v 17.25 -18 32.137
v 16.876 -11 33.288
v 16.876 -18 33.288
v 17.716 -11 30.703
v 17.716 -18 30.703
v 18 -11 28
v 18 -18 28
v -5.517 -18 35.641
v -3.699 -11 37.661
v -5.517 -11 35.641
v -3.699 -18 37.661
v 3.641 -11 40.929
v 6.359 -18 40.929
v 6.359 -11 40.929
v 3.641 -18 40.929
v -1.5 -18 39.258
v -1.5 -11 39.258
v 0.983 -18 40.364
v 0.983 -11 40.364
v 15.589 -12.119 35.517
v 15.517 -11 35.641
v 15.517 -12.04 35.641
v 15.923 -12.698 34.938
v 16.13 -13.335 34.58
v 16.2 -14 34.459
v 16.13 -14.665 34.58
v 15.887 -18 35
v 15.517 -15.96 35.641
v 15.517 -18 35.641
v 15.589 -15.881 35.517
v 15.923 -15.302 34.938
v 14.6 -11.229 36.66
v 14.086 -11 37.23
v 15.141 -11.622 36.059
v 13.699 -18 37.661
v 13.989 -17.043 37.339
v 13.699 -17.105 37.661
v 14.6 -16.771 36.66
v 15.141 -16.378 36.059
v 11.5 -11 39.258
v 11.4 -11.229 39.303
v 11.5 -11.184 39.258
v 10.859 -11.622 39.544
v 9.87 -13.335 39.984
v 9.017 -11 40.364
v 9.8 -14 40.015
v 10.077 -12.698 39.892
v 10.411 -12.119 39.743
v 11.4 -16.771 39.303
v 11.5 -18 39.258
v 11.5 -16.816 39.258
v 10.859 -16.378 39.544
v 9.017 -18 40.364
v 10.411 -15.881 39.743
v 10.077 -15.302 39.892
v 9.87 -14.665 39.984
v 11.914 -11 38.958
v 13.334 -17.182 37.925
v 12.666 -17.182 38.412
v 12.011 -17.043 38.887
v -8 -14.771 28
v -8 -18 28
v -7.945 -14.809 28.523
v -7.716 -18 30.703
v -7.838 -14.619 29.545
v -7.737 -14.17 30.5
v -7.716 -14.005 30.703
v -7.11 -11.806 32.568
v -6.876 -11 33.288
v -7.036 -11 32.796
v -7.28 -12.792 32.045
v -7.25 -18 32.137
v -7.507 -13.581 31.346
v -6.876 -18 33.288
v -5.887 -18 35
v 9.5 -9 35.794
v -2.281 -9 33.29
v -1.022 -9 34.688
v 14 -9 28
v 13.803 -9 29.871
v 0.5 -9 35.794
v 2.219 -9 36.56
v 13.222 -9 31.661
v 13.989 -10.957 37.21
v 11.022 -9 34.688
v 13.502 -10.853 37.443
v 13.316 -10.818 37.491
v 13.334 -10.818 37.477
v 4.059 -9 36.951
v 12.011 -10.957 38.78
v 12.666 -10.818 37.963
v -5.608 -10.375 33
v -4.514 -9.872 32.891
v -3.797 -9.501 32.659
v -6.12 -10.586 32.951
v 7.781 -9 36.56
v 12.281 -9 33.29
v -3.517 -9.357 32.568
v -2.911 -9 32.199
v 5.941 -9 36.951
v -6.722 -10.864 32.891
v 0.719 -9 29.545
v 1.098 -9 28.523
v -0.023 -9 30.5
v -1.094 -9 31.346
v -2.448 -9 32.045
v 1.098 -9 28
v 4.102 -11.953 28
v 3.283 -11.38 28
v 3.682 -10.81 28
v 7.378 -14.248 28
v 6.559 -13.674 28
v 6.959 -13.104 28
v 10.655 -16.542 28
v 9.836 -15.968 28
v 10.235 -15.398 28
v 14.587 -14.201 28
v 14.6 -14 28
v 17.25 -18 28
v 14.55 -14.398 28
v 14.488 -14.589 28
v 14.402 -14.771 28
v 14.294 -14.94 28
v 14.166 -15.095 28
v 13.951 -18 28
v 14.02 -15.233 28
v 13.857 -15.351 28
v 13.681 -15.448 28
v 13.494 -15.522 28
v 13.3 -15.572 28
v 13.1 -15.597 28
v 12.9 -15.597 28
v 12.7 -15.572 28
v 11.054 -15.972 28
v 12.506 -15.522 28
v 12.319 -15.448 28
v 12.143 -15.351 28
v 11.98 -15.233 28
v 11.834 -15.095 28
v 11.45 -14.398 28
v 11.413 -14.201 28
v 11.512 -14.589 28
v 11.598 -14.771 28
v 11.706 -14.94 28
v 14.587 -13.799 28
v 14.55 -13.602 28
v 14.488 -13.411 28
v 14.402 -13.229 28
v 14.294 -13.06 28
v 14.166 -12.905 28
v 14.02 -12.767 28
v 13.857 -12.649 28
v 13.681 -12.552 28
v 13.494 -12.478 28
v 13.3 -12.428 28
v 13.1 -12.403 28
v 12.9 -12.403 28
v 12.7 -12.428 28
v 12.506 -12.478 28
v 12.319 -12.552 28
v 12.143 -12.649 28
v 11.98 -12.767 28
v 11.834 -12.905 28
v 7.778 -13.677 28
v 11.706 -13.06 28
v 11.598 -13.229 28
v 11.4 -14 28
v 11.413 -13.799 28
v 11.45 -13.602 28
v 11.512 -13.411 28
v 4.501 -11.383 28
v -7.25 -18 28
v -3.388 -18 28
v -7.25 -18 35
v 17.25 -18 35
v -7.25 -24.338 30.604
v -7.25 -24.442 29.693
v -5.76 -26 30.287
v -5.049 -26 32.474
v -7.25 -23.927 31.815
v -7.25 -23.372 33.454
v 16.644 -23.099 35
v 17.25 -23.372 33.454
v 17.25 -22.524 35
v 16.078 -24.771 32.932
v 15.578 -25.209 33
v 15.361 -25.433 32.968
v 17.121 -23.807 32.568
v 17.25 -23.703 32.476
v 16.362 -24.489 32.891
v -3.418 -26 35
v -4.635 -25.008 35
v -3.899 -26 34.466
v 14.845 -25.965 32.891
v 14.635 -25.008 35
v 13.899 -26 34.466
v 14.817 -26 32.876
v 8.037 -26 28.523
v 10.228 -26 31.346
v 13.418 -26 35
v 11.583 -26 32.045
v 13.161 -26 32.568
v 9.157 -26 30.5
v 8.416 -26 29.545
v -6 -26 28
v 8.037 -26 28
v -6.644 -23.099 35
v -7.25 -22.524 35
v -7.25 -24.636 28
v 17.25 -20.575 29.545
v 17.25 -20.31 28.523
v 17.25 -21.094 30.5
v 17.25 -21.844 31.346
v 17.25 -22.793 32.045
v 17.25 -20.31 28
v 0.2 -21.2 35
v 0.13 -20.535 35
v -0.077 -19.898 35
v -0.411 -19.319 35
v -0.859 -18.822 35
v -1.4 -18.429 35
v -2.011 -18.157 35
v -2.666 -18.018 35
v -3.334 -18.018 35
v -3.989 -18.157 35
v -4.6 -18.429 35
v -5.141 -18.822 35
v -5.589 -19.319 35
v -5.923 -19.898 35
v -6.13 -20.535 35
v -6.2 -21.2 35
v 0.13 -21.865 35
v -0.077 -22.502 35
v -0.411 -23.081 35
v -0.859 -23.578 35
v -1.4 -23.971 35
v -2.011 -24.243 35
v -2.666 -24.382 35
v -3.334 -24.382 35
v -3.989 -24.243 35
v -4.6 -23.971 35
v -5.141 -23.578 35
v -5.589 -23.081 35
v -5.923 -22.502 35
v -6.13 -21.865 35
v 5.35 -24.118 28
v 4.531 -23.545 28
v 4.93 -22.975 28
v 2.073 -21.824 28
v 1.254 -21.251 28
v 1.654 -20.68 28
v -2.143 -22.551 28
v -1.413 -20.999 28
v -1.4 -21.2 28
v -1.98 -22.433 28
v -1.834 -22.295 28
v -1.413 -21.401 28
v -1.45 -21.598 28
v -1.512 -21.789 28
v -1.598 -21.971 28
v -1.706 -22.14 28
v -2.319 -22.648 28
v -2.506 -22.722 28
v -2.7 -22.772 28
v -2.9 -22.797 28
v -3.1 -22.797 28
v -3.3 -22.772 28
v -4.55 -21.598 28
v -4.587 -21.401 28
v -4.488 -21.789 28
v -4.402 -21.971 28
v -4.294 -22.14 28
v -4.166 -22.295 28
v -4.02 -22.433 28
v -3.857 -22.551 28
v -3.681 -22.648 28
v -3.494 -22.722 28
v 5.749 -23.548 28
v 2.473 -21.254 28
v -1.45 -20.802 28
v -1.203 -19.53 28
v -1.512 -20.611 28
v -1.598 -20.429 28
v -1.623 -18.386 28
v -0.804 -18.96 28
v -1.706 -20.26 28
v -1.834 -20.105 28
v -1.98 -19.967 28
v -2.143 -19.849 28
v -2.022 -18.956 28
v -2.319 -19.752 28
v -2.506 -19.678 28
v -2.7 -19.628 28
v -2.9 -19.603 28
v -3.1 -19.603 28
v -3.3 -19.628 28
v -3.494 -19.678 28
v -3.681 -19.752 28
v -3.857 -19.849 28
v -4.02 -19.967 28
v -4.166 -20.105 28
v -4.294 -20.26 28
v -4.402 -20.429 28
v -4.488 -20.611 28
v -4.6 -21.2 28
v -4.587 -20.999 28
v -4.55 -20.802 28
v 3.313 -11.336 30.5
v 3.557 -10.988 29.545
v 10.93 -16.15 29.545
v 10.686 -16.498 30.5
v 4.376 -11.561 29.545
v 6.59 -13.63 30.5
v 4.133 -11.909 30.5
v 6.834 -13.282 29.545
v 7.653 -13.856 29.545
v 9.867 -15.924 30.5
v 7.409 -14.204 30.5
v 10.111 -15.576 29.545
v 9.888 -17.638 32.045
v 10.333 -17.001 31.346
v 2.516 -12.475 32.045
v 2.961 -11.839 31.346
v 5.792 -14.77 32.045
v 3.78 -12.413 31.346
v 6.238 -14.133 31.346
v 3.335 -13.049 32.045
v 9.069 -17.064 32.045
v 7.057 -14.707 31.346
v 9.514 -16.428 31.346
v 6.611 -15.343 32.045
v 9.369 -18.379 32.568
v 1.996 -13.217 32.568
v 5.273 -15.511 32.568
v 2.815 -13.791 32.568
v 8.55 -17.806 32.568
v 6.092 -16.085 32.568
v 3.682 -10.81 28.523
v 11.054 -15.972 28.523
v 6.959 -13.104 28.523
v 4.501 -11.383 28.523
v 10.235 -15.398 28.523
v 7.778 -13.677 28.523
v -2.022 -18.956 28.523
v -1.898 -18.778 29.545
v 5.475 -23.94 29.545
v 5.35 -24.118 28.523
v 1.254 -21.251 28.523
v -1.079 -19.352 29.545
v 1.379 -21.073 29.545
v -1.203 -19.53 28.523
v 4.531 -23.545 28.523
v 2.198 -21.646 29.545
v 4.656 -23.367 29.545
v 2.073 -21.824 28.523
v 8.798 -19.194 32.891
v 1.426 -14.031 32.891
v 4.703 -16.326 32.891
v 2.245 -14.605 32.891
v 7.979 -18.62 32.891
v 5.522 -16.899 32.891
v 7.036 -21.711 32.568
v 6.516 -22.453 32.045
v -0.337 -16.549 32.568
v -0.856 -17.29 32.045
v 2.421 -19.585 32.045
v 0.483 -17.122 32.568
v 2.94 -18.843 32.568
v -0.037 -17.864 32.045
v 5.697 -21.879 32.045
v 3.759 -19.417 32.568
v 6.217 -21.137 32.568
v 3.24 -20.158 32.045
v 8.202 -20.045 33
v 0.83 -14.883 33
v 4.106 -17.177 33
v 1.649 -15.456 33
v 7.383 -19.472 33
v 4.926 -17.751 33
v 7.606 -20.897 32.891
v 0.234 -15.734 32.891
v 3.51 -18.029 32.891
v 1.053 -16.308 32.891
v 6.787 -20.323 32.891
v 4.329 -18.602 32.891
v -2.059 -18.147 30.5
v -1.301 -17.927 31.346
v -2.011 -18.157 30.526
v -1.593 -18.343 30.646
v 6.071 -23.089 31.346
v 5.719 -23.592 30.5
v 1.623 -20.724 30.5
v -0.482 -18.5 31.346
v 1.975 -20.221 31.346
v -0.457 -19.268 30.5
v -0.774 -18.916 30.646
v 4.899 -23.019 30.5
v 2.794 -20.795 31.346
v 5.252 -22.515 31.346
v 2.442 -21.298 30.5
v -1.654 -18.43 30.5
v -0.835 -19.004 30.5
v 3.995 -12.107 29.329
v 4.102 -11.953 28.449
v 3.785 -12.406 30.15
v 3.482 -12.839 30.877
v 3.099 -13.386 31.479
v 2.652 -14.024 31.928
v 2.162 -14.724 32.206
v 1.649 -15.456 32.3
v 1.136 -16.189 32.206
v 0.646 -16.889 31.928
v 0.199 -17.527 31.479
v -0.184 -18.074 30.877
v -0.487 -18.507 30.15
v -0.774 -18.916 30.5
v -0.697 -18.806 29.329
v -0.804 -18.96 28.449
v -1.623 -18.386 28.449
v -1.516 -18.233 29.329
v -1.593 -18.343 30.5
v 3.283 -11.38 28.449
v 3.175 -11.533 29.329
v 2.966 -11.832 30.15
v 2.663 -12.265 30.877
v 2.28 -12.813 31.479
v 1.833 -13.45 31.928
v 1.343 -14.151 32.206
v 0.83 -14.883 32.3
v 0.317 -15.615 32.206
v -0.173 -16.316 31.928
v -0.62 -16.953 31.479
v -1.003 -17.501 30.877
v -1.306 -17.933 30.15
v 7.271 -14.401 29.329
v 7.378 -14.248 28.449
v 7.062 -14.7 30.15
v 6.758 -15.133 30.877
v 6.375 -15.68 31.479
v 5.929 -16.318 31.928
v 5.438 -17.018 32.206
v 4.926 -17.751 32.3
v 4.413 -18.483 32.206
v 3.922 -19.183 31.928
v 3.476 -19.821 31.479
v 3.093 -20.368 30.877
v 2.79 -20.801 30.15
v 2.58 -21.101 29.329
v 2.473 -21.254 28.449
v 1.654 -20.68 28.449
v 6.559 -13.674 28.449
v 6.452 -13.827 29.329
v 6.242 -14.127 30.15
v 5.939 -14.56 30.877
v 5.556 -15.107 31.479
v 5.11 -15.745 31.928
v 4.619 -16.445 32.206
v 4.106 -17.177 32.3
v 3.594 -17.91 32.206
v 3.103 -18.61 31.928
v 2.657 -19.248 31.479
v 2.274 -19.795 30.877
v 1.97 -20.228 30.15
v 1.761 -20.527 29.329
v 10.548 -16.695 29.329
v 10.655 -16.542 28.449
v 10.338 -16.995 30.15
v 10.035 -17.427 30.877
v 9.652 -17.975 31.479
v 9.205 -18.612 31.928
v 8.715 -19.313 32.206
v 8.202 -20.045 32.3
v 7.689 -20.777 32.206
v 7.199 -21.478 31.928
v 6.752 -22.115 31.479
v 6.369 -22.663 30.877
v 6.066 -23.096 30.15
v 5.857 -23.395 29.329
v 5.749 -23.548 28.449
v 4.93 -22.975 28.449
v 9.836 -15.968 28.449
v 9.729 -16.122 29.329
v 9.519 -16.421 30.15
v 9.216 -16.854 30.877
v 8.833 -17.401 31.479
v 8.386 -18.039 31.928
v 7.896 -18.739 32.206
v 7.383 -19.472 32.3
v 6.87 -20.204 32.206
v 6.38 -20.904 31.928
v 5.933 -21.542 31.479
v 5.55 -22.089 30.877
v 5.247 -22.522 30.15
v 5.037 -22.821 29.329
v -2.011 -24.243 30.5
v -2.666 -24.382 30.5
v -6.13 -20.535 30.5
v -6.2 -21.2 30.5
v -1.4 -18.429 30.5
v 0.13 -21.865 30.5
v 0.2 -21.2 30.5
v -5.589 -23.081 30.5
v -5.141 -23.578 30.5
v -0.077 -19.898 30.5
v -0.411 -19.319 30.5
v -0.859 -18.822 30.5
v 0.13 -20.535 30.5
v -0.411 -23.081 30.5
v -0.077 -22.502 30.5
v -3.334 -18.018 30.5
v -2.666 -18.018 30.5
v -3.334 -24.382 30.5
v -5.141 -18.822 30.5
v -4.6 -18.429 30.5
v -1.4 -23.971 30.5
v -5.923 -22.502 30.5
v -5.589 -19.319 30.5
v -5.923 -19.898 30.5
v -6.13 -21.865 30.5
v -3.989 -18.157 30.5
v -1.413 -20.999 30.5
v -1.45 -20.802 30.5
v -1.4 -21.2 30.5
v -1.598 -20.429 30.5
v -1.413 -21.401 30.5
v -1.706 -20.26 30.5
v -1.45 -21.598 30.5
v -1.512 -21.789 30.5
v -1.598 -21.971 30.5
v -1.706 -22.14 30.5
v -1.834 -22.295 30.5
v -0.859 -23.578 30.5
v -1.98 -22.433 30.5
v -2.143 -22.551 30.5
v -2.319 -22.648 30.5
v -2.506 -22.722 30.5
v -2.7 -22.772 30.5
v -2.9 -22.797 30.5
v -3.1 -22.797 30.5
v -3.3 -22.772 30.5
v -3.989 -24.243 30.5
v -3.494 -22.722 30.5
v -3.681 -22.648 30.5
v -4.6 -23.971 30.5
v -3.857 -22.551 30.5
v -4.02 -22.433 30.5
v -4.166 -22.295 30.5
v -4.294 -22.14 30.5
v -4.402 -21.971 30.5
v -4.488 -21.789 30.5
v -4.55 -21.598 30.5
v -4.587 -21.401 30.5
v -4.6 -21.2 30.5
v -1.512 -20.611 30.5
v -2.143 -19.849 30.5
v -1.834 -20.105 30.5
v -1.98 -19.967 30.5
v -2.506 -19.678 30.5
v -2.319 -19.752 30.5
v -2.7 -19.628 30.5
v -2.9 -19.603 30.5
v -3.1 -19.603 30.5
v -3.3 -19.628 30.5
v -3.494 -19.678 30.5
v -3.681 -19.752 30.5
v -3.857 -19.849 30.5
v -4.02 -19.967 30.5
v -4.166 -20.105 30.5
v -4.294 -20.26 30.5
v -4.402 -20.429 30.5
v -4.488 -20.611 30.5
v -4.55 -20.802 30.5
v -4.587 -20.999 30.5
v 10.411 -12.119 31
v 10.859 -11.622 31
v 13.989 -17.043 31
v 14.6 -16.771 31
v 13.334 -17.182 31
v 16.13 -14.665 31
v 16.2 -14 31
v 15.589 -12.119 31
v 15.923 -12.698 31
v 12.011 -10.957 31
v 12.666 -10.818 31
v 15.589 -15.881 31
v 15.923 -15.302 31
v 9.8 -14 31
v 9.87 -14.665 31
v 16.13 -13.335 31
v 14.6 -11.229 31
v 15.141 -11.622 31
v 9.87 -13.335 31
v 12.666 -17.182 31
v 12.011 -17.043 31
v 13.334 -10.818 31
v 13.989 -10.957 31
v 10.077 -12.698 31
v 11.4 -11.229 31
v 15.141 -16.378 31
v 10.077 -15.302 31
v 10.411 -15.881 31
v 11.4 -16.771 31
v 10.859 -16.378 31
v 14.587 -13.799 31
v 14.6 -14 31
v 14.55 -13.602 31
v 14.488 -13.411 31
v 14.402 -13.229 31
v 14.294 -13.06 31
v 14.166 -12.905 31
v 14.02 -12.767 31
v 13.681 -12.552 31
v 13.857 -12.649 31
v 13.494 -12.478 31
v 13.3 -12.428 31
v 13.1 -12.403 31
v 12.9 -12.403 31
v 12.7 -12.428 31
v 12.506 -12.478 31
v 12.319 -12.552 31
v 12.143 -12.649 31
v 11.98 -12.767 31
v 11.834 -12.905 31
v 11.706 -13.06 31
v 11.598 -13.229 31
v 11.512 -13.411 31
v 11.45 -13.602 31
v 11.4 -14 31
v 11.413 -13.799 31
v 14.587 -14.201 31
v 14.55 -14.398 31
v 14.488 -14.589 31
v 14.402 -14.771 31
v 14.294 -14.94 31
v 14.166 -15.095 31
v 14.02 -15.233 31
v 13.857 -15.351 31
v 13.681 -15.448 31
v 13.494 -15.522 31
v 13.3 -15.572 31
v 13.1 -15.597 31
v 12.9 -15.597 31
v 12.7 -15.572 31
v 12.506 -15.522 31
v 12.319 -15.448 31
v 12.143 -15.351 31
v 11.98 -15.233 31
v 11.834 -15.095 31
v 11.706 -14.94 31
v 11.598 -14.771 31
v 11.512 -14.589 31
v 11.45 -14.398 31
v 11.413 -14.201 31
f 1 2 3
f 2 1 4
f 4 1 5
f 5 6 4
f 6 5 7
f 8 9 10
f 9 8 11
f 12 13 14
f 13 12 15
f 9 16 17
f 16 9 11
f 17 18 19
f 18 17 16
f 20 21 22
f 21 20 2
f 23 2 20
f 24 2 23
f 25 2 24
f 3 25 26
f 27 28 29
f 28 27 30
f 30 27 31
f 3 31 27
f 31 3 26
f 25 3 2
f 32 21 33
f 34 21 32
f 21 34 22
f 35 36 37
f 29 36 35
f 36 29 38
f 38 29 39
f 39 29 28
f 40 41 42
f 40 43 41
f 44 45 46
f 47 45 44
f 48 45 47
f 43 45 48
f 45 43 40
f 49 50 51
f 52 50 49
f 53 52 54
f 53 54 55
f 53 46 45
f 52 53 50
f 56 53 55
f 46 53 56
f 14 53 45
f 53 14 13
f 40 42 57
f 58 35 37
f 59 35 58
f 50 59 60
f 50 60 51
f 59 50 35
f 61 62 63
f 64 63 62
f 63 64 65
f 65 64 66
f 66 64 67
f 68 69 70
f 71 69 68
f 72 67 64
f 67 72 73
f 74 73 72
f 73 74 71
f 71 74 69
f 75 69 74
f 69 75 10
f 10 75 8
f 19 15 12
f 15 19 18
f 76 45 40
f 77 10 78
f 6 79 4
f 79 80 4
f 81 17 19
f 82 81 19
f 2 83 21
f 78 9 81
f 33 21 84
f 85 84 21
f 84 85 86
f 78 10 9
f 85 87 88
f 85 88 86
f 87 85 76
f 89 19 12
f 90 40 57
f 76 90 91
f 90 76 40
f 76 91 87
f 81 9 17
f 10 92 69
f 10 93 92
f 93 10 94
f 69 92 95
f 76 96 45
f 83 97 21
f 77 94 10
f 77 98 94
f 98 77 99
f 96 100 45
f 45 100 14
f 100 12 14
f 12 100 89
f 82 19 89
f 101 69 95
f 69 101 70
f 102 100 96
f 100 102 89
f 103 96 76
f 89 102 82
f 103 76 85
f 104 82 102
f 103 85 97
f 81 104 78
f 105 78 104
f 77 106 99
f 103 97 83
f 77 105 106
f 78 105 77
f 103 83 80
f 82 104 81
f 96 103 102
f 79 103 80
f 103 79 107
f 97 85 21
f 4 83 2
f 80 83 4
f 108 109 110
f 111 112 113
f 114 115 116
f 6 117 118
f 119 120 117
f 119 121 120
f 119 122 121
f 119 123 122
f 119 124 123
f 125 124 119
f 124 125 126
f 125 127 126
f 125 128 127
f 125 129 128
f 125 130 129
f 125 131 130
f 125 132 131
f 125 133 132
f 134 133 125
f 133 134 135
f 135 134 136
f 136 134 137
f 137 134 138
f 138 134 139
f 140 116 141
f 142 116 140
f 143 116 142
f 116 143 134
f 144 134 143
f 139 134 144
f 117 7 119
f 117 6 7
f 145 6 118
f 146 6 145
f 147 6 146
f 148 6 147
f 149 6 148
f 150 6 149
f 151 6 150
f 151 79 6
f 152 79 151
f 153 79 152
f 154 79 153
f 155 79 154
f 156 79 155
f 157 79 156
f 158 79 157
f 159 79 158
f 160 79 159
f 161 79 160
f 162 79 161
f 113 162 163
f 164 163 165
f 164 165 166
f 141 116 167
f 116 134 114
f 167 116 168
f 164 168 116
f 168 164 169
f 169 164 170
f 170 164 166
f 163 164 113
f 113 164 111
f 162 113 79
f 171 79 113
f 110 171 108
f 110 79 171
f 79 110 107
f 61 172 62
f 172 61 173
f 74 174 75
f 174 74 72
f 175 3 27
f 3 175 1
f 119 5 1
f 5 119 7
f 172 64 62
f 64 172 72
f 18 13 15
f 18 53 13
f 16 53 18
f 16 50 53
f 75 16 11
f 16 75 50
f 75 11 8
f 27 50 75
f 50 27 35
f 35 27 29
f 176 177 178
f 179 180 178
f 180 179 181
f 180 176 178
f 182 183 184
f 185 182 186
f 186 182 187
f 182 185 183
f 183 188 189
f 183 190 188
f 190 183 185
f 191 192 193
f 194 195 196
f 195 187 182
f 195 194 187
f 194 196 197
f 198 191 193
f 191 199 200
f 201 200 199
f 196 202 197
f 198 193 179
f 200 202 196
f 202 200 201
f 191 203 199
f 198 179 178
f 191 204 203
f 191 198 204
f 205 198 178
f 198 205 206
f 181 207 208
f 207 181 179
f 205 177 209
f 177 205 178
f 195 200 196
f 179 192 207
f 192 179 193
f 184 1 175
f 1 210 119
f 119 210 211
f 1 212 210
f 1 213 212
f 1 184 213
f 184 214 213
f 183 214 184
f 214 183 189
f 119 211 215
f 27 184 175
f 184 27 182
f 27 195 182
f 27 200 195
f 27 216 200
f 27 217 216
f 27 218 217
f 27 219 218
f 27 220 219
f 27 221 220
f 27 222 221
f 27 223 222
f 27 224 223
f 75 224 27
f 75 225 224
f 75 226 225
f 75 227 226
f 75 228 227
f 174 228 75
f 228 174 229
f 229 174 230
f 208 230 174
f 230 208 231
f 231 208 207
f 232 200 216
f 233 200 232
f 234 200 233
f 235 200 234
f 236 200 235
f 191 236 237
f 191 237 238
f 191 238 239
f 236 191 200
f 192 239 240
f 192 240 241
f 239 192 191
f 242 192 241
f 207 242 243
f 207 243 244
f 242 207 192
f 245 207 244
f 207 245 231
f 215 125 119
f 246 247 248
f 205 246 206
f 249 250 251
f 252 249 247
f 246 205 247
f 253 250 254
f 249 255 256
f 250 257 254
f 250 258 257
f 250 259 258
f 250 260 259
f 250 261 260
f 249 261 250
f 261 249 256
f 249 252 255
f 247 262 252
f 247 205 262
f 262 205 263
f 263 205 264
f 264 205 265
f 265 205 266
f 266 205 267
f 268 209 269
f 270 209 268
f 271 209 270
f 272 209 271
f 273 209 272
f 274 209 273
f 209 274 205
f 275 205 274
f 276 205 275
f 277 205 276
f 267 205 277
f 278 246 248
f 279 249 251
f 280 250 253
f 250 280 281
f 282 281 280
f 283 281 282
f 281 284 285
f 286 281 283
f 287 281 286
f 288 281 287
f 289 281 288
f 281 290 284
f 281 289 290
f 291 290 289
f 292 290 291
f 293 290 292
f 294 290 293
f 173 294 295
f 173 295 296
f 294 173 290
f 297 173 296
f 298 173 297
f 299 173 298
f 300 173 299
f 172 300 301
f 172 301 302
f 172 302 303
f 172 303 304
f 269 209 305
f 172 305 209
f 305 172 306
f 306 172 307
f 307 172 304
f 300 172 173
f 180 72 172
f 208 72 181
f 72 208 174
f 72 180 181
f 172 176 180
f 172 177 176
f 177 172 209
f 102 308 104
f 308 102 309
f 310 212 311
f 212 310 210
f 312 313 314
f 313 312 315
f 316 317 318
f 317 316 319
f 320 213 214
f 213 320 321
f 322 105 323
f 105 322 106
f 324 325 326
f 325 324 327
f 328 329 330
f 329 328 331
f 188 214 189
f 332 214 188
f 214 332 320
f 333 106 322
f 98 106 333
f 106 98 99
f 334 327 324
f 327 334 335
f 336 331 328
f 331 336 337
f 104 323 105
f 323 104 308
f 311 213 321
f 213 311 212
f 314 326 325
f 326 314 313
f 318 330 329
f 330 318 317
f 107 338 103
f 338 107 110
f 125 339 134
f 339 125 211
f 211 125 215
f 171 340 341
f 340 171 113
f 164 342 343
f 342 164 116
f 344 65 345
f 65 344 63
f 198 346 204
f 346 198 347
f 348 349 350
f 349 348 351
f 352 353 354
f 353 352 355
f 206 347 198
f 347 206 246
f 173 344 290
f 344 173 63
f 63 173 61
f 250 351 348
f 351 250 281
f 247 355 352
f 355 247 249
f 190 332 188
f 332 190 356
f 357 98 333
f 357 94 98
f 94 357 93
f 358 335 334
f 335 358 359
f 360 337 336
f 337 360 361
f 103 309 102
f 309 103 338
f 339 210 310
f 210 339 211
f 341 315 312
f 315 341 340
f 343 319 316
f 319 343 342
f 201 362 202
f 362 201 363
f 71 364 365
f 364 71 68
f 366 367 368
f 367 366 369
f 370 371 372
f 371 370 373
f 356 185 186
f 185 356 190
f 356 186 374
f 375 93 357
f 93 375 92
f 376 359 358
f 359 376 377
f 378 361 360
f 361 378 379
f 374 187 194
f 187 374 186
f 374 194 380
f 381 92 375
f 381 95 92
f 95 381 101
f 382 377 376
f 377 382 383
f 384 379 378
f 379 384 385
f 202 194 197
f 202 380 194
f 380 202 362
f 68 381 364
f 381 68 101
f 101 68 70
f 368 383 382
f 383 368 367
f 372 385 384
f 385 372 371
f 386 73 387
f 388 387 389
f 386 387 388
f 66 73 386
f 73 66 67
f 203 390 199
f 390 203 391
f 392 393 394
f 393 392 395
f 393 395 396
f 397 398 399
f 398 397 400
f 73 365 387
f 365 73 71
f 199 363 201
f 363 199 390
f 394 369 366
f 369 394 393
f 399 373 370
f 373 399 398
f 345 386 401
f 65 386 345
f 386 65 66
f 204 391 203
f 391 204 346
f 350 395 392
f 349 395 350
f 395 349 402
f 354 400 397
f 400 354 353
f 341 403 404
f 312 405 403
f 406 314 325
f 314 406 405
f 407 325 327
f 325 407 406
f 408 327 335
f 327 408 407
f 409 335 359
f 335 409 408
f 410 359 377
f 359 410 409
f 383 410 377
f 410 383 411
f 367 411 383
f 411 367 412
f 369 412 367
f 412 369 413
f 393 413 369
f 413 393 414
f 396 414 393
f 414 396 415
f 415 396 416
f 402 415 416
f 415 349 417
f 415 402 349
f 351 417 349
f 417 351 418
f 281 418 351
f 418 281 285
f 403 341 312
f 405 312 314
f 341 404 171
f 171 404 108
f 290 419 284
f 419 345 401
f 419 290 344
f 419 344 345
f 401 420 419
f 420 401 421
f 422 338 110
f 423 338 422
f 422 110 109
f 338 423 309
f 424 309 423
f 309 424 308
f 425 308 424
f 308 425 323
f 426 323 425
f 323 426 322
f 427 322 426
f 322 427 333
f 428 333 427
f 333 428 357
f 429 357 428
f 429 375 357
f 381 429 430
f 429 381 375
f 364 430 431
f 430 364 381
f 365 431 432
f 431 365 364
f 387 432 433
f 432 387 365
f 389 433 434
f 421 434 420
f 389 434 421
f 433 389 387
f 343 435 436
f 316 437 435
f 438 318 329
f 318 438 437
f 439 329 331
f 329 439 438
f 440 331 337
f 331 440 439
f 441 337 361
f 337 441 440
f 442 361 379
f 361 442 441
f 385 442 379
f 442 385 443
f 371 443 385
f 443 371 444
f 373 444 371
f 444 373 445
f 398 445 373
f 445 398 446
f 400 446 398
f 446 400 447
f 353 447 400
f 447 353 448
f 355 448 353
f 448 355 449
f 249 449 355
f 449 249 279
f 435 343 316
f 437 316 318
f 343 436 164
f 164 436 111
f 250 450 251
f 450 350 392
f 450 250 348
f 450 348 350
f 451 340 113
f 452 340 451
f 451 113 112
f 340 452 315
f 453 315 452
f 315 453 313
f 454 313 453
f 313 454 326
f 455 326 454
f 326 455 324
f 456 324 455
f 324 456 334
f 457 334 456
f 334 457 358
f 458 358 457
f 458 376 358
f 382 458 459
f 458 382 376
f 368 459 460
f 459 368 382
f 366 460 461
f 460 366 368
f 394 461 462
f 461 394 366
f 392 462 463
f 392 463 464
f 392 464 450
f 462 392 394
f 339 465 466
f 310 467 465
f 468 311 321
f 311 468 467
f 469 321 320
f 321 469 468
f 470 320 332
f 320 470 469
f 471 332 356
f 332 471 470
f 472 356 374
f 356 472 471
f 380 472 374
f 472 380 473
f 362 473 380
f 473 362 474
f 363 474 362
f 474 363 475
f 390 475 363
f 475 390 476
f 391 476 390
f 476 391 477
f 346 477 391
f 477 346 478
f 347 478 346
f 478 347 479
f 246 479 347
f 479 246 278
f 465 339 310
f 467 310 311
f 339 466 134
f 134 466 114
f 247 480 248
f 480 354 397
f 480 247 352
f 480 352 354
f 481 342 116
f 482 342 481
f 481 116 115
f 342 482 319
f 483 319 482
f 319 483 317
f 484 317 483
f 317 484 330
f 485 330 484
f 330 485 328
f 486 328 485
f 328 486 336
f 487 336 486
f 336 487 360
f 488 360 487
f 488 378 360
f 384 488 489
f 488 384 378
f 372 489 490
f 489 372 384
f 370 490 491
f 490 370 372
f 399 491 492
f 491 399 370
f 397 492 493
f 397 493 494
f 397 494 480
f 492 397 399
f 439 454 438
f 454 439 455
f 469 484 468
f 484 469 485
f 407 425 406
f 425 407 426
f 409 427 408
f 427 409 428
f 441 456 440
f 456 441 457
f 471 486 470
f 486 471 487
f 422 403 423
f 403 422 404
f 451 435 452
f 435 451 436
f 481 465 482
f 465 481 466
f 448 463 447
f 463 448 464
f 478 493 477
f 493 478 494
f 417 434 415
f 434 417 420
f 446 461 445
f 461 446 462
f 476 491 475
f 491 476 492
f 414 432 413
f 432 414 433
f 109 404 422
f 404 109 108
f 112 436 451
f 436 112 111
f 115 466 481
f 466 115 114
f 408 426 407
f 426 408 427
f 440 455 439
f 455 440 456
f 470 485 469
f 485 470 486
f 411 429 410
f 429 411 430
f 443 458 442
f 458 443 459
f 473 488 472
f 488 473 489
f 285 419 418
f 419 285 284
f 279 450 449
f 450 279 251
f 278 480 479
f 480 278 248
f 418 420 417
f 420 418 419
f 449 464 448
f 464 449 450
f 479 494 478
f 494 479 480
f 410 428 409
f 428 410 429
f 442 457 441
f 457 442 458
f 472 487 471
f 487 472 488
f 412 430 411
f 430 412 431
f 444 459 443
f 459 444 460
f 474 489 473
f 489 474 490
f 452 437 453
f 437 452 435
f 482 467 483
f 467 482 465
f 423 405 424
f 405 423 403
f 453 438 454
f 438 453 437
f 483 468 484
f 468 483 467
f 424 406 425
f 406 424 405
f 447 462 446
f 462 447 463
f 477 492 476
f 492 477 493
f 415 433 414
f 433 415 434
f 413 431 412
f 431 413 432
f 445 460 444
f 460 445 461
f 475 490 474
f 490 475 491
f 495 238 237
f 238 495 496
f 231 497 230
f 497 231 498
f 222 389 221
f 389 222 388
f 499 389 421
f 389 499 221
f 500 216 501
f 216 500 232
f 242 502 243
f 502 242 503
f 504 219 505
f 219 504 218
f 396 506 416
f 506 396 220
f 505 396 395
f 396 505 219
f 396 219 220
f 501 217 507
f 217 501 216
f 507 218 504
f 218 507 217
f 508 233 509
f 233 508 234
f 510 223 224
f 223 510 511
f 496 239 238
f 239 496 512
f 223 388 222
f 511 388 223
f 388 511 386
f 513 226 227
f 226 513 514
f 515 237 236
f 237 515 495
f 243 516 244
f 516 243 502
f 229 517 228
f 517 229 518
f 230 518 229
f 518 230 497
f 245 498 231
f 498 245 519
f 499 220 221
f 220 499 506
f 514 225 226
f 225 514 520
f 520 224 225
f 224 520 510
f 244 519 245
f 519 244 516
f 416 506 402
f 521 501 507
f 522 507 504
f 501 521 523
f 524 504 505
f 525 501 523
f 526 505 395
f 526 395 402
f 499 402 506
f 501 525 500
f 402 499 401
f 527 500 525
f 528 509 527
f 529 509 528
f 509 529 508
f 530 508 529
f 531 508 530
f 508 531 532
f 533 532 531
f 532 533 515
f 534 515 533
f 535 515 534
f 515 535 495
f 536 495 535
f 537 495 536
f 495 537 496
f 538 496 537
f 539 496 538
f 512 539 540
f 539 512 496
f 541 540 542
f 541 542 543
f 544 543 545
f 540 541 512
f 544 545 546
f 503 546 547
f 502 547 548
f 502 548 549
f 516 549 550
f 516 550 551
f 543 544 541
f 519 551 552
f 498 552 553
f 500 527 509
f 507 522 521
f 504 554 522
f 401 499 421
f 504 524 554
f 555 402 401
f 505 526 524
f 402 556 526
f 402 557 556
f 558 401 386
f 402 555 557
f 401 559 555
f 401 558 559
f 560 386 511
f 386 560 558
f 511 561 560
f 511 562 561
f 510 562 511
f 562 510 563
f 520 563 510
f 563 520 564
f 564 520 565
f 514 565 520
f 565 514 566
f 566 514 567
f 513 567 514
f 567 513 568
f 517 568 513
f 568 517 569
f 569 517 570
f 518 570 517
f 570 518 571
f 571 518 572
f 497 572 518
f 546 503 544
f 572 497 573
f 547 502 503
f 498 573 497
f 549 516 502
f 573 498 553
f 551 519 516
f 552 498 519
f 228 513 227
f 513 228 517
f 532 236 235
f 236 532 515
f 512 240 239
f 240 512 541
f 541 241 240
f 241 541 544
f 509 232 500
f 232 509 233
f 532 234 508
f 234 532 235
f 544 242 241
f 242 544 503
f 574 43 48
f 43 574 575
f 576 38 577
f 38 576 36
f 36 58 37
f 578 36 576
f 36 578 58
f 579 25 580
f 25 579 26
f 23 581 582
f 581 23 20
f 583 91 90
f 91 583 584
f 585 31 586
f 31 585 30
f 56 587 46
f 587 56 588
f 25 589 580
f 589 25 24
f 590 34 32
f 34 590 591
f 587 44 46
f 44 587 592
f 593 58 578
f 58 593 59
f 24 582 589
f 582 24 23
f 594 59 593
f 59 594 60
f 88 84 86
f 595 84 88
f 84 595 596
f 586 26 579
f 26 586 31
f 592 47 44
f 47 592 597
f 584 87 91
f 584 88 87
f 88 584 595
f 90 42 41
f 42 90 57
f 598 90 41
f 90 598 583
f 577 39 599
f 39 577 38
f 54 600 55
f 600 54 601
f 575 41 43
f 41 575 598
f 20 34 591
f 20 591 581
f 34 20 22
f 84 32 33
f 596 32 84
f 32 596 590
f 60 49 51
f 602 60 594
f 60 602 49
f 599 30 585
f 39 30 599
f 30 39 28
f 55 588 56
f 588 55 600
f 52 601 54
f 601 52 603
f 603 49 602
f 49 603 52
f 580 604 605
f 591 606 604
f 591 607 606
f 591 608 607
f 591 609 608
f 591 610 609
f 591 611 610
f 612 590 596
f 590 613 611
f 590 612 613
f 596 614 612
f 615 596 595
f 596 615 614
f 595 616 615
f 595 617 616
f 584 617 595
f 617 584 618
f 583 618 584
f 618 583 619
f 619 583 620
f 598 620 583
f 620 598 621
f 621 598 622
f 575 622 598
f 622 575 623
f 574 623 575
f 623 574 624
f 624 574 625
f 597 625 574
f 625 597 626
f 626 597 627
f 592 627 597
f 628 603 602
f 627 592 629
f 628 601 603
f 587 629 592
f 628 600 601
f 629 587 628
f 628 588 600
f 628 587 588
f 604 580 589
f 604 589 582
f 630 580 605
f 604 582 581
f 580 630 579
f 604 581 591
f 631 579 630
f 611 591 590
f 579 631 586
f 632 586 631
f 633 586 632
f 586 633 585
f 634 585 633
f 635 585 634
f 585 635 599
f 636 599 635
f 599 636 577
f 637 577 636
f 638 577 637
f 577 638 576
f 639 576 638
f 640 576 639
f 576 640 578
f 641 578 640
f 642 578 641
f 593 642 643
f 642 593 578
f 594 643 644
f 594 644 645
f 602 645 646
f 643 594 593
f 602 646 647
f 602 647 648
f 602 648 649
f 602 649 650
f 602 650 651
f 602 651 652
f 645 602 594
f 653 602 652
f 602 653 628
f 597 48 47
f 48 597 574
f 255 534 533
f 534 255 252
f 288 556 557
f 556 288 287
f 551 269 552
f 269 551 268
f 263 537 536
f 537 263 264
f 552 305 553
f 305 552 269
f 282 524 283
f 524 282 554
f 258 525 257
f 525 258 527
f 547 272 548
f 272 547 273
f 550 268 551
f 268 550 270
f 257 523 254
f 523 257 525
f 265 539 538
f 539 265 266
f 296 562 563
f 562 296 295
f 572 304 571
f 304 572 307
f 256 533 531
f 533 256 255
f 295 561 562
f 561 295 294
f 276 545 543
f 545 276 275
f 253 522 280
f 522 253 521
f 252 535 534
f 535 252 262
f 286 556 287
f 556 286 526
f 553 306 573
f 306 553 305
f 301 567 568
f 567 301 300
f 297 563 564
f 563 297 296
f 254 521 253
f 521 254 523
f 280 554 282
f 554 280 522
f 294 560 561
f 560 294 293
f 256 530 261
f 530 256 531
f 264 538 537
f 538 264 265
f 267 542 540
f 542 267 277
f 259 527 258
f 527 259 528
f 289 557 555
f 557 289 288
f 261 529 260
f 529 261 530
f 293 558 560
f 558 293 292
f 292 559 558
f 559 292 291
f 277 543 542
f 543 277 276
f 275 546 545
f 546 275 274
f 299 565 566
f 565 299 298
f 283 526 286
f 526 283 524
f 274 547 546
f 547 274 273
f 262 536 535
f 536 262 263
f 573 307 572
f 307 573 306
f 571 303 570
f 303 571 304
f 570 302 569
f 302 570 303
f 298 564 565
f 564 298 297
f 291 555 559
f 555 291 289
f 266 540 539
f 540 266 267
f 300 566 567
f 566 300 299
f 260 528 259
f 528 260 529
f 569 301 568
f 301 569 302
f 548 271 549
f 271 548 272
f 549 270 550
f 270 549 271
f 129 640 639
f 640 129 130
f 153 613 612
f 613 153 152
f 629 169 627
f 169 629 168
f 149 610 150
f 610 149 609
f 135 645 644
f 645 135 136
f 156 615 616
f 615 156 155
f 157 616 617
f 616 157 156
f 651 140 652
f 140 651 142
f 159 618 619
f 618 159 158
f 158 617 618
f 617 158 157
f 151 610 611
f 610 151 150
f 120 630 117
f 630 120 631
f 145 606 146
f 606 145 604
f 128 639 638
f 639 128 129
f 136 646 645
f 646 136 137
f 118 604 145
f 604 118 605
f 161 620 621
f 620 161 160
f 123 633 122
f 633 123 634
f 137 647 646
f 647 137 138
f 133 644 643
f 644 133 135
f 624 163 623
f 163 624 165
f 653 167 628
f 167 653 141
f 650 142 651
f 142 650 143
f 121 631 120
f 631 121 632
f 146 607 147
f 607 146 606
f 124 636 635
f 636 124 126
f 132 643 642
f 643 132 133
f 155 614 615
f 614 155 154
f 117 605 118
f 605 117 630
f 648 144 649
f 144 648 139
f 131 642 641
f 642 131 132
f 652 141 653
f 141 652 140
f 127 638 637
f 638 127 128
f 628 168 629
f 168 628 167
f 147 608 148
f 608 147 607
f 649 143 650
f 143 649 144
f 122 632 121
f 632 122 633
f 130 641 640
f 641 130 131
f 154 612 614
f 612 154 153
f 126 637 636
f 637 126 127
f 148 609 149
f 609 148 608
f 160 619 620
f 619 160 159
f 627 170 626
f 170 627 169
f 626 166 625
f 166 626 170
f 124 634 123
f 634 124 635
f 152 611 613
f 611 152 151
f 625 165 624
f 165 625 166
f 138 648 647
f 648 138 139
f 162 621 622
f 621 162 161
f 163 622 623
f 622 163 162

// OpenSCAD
// PRUSA iteration4
// Heatbed cable clip
// GNU GPL v3
// Josef Průša <iam@josefprusa.cz> and contributors
// http://www.reprap.org/wiki/Prusa_Mendel
// http://prusamendel.org

module heatbed_cable_clip() {

  difference() {

    union() {
      difference() {
        union() {
          // body base
          translate([75, 99, 28]) rotate([90, 0, 0]) cylinder(h=15, r=13, $fn=30);
          translate([75, 101, 28]) rotate([90, 0, 0]) cylinder(h=2, r1=9, r2=13, $fn=30);
        }

        // cut flat and shape
        translate([60, 82, 14]) cube([30, 20, 14]);
        translate([60, 72, 20]) cube([30, 20, 30]);
      }

      difference() {
        translate([62.75, 84, 28]) cube([24.5, 8, 7]);
        difference() {
          translate([75, 85, 28]) rotate([90, 0, 0]) cube([30, 20, 10], center=true);
          translate([75, 90, 28]) rotate([90, 0, 0]) cylinder(h=6, r1=16.5, r2=11, $fn=30);
        }
      }
    }

    // cable opening
    translate([61, 102, 28]) rotate([35, 90, 0])

        difference() {

          cylinder(h=35, r=5, $fn=30);

          //translate([0,0,3]) cylinder(h=5,r=5,$fn=30);
          translate([0, 0, 12]) cylinder(h=1, r=5, $fn=30);
          translate([0, 0, 16]) cylinder(h=1, r=5, $fn=30);
          translate([0, 0, 20]) cylinder(h=1, r=5, $fn=30);
        }
    translate([61, 102, 28]) rotate([35, 90, 0]) cylinder(h=35, r=4.3, $fn=30);

    // screw heads
    translate([67, 88.8, 30.5]) rotate([0, 0, 0]) cylinder(h=10, r=3.2, $fn=30);
    translate([83, 96, 31]) rotate([0, 0, 0]) cylinder(h=10, r=3.2, $fn=30);

    // screws
    translate([67, 88.8, 14]) rotate([0, 0, 0]) cylinder(h=35, r=1.6, $fn=50);
    translate([83, 96, 14]) rotate([0, 0, 0]) cylinder(h=35, r=1.6, $fn=50);
  }
}

translate([-70, -110, 0]) heatbed_cable_clip();
